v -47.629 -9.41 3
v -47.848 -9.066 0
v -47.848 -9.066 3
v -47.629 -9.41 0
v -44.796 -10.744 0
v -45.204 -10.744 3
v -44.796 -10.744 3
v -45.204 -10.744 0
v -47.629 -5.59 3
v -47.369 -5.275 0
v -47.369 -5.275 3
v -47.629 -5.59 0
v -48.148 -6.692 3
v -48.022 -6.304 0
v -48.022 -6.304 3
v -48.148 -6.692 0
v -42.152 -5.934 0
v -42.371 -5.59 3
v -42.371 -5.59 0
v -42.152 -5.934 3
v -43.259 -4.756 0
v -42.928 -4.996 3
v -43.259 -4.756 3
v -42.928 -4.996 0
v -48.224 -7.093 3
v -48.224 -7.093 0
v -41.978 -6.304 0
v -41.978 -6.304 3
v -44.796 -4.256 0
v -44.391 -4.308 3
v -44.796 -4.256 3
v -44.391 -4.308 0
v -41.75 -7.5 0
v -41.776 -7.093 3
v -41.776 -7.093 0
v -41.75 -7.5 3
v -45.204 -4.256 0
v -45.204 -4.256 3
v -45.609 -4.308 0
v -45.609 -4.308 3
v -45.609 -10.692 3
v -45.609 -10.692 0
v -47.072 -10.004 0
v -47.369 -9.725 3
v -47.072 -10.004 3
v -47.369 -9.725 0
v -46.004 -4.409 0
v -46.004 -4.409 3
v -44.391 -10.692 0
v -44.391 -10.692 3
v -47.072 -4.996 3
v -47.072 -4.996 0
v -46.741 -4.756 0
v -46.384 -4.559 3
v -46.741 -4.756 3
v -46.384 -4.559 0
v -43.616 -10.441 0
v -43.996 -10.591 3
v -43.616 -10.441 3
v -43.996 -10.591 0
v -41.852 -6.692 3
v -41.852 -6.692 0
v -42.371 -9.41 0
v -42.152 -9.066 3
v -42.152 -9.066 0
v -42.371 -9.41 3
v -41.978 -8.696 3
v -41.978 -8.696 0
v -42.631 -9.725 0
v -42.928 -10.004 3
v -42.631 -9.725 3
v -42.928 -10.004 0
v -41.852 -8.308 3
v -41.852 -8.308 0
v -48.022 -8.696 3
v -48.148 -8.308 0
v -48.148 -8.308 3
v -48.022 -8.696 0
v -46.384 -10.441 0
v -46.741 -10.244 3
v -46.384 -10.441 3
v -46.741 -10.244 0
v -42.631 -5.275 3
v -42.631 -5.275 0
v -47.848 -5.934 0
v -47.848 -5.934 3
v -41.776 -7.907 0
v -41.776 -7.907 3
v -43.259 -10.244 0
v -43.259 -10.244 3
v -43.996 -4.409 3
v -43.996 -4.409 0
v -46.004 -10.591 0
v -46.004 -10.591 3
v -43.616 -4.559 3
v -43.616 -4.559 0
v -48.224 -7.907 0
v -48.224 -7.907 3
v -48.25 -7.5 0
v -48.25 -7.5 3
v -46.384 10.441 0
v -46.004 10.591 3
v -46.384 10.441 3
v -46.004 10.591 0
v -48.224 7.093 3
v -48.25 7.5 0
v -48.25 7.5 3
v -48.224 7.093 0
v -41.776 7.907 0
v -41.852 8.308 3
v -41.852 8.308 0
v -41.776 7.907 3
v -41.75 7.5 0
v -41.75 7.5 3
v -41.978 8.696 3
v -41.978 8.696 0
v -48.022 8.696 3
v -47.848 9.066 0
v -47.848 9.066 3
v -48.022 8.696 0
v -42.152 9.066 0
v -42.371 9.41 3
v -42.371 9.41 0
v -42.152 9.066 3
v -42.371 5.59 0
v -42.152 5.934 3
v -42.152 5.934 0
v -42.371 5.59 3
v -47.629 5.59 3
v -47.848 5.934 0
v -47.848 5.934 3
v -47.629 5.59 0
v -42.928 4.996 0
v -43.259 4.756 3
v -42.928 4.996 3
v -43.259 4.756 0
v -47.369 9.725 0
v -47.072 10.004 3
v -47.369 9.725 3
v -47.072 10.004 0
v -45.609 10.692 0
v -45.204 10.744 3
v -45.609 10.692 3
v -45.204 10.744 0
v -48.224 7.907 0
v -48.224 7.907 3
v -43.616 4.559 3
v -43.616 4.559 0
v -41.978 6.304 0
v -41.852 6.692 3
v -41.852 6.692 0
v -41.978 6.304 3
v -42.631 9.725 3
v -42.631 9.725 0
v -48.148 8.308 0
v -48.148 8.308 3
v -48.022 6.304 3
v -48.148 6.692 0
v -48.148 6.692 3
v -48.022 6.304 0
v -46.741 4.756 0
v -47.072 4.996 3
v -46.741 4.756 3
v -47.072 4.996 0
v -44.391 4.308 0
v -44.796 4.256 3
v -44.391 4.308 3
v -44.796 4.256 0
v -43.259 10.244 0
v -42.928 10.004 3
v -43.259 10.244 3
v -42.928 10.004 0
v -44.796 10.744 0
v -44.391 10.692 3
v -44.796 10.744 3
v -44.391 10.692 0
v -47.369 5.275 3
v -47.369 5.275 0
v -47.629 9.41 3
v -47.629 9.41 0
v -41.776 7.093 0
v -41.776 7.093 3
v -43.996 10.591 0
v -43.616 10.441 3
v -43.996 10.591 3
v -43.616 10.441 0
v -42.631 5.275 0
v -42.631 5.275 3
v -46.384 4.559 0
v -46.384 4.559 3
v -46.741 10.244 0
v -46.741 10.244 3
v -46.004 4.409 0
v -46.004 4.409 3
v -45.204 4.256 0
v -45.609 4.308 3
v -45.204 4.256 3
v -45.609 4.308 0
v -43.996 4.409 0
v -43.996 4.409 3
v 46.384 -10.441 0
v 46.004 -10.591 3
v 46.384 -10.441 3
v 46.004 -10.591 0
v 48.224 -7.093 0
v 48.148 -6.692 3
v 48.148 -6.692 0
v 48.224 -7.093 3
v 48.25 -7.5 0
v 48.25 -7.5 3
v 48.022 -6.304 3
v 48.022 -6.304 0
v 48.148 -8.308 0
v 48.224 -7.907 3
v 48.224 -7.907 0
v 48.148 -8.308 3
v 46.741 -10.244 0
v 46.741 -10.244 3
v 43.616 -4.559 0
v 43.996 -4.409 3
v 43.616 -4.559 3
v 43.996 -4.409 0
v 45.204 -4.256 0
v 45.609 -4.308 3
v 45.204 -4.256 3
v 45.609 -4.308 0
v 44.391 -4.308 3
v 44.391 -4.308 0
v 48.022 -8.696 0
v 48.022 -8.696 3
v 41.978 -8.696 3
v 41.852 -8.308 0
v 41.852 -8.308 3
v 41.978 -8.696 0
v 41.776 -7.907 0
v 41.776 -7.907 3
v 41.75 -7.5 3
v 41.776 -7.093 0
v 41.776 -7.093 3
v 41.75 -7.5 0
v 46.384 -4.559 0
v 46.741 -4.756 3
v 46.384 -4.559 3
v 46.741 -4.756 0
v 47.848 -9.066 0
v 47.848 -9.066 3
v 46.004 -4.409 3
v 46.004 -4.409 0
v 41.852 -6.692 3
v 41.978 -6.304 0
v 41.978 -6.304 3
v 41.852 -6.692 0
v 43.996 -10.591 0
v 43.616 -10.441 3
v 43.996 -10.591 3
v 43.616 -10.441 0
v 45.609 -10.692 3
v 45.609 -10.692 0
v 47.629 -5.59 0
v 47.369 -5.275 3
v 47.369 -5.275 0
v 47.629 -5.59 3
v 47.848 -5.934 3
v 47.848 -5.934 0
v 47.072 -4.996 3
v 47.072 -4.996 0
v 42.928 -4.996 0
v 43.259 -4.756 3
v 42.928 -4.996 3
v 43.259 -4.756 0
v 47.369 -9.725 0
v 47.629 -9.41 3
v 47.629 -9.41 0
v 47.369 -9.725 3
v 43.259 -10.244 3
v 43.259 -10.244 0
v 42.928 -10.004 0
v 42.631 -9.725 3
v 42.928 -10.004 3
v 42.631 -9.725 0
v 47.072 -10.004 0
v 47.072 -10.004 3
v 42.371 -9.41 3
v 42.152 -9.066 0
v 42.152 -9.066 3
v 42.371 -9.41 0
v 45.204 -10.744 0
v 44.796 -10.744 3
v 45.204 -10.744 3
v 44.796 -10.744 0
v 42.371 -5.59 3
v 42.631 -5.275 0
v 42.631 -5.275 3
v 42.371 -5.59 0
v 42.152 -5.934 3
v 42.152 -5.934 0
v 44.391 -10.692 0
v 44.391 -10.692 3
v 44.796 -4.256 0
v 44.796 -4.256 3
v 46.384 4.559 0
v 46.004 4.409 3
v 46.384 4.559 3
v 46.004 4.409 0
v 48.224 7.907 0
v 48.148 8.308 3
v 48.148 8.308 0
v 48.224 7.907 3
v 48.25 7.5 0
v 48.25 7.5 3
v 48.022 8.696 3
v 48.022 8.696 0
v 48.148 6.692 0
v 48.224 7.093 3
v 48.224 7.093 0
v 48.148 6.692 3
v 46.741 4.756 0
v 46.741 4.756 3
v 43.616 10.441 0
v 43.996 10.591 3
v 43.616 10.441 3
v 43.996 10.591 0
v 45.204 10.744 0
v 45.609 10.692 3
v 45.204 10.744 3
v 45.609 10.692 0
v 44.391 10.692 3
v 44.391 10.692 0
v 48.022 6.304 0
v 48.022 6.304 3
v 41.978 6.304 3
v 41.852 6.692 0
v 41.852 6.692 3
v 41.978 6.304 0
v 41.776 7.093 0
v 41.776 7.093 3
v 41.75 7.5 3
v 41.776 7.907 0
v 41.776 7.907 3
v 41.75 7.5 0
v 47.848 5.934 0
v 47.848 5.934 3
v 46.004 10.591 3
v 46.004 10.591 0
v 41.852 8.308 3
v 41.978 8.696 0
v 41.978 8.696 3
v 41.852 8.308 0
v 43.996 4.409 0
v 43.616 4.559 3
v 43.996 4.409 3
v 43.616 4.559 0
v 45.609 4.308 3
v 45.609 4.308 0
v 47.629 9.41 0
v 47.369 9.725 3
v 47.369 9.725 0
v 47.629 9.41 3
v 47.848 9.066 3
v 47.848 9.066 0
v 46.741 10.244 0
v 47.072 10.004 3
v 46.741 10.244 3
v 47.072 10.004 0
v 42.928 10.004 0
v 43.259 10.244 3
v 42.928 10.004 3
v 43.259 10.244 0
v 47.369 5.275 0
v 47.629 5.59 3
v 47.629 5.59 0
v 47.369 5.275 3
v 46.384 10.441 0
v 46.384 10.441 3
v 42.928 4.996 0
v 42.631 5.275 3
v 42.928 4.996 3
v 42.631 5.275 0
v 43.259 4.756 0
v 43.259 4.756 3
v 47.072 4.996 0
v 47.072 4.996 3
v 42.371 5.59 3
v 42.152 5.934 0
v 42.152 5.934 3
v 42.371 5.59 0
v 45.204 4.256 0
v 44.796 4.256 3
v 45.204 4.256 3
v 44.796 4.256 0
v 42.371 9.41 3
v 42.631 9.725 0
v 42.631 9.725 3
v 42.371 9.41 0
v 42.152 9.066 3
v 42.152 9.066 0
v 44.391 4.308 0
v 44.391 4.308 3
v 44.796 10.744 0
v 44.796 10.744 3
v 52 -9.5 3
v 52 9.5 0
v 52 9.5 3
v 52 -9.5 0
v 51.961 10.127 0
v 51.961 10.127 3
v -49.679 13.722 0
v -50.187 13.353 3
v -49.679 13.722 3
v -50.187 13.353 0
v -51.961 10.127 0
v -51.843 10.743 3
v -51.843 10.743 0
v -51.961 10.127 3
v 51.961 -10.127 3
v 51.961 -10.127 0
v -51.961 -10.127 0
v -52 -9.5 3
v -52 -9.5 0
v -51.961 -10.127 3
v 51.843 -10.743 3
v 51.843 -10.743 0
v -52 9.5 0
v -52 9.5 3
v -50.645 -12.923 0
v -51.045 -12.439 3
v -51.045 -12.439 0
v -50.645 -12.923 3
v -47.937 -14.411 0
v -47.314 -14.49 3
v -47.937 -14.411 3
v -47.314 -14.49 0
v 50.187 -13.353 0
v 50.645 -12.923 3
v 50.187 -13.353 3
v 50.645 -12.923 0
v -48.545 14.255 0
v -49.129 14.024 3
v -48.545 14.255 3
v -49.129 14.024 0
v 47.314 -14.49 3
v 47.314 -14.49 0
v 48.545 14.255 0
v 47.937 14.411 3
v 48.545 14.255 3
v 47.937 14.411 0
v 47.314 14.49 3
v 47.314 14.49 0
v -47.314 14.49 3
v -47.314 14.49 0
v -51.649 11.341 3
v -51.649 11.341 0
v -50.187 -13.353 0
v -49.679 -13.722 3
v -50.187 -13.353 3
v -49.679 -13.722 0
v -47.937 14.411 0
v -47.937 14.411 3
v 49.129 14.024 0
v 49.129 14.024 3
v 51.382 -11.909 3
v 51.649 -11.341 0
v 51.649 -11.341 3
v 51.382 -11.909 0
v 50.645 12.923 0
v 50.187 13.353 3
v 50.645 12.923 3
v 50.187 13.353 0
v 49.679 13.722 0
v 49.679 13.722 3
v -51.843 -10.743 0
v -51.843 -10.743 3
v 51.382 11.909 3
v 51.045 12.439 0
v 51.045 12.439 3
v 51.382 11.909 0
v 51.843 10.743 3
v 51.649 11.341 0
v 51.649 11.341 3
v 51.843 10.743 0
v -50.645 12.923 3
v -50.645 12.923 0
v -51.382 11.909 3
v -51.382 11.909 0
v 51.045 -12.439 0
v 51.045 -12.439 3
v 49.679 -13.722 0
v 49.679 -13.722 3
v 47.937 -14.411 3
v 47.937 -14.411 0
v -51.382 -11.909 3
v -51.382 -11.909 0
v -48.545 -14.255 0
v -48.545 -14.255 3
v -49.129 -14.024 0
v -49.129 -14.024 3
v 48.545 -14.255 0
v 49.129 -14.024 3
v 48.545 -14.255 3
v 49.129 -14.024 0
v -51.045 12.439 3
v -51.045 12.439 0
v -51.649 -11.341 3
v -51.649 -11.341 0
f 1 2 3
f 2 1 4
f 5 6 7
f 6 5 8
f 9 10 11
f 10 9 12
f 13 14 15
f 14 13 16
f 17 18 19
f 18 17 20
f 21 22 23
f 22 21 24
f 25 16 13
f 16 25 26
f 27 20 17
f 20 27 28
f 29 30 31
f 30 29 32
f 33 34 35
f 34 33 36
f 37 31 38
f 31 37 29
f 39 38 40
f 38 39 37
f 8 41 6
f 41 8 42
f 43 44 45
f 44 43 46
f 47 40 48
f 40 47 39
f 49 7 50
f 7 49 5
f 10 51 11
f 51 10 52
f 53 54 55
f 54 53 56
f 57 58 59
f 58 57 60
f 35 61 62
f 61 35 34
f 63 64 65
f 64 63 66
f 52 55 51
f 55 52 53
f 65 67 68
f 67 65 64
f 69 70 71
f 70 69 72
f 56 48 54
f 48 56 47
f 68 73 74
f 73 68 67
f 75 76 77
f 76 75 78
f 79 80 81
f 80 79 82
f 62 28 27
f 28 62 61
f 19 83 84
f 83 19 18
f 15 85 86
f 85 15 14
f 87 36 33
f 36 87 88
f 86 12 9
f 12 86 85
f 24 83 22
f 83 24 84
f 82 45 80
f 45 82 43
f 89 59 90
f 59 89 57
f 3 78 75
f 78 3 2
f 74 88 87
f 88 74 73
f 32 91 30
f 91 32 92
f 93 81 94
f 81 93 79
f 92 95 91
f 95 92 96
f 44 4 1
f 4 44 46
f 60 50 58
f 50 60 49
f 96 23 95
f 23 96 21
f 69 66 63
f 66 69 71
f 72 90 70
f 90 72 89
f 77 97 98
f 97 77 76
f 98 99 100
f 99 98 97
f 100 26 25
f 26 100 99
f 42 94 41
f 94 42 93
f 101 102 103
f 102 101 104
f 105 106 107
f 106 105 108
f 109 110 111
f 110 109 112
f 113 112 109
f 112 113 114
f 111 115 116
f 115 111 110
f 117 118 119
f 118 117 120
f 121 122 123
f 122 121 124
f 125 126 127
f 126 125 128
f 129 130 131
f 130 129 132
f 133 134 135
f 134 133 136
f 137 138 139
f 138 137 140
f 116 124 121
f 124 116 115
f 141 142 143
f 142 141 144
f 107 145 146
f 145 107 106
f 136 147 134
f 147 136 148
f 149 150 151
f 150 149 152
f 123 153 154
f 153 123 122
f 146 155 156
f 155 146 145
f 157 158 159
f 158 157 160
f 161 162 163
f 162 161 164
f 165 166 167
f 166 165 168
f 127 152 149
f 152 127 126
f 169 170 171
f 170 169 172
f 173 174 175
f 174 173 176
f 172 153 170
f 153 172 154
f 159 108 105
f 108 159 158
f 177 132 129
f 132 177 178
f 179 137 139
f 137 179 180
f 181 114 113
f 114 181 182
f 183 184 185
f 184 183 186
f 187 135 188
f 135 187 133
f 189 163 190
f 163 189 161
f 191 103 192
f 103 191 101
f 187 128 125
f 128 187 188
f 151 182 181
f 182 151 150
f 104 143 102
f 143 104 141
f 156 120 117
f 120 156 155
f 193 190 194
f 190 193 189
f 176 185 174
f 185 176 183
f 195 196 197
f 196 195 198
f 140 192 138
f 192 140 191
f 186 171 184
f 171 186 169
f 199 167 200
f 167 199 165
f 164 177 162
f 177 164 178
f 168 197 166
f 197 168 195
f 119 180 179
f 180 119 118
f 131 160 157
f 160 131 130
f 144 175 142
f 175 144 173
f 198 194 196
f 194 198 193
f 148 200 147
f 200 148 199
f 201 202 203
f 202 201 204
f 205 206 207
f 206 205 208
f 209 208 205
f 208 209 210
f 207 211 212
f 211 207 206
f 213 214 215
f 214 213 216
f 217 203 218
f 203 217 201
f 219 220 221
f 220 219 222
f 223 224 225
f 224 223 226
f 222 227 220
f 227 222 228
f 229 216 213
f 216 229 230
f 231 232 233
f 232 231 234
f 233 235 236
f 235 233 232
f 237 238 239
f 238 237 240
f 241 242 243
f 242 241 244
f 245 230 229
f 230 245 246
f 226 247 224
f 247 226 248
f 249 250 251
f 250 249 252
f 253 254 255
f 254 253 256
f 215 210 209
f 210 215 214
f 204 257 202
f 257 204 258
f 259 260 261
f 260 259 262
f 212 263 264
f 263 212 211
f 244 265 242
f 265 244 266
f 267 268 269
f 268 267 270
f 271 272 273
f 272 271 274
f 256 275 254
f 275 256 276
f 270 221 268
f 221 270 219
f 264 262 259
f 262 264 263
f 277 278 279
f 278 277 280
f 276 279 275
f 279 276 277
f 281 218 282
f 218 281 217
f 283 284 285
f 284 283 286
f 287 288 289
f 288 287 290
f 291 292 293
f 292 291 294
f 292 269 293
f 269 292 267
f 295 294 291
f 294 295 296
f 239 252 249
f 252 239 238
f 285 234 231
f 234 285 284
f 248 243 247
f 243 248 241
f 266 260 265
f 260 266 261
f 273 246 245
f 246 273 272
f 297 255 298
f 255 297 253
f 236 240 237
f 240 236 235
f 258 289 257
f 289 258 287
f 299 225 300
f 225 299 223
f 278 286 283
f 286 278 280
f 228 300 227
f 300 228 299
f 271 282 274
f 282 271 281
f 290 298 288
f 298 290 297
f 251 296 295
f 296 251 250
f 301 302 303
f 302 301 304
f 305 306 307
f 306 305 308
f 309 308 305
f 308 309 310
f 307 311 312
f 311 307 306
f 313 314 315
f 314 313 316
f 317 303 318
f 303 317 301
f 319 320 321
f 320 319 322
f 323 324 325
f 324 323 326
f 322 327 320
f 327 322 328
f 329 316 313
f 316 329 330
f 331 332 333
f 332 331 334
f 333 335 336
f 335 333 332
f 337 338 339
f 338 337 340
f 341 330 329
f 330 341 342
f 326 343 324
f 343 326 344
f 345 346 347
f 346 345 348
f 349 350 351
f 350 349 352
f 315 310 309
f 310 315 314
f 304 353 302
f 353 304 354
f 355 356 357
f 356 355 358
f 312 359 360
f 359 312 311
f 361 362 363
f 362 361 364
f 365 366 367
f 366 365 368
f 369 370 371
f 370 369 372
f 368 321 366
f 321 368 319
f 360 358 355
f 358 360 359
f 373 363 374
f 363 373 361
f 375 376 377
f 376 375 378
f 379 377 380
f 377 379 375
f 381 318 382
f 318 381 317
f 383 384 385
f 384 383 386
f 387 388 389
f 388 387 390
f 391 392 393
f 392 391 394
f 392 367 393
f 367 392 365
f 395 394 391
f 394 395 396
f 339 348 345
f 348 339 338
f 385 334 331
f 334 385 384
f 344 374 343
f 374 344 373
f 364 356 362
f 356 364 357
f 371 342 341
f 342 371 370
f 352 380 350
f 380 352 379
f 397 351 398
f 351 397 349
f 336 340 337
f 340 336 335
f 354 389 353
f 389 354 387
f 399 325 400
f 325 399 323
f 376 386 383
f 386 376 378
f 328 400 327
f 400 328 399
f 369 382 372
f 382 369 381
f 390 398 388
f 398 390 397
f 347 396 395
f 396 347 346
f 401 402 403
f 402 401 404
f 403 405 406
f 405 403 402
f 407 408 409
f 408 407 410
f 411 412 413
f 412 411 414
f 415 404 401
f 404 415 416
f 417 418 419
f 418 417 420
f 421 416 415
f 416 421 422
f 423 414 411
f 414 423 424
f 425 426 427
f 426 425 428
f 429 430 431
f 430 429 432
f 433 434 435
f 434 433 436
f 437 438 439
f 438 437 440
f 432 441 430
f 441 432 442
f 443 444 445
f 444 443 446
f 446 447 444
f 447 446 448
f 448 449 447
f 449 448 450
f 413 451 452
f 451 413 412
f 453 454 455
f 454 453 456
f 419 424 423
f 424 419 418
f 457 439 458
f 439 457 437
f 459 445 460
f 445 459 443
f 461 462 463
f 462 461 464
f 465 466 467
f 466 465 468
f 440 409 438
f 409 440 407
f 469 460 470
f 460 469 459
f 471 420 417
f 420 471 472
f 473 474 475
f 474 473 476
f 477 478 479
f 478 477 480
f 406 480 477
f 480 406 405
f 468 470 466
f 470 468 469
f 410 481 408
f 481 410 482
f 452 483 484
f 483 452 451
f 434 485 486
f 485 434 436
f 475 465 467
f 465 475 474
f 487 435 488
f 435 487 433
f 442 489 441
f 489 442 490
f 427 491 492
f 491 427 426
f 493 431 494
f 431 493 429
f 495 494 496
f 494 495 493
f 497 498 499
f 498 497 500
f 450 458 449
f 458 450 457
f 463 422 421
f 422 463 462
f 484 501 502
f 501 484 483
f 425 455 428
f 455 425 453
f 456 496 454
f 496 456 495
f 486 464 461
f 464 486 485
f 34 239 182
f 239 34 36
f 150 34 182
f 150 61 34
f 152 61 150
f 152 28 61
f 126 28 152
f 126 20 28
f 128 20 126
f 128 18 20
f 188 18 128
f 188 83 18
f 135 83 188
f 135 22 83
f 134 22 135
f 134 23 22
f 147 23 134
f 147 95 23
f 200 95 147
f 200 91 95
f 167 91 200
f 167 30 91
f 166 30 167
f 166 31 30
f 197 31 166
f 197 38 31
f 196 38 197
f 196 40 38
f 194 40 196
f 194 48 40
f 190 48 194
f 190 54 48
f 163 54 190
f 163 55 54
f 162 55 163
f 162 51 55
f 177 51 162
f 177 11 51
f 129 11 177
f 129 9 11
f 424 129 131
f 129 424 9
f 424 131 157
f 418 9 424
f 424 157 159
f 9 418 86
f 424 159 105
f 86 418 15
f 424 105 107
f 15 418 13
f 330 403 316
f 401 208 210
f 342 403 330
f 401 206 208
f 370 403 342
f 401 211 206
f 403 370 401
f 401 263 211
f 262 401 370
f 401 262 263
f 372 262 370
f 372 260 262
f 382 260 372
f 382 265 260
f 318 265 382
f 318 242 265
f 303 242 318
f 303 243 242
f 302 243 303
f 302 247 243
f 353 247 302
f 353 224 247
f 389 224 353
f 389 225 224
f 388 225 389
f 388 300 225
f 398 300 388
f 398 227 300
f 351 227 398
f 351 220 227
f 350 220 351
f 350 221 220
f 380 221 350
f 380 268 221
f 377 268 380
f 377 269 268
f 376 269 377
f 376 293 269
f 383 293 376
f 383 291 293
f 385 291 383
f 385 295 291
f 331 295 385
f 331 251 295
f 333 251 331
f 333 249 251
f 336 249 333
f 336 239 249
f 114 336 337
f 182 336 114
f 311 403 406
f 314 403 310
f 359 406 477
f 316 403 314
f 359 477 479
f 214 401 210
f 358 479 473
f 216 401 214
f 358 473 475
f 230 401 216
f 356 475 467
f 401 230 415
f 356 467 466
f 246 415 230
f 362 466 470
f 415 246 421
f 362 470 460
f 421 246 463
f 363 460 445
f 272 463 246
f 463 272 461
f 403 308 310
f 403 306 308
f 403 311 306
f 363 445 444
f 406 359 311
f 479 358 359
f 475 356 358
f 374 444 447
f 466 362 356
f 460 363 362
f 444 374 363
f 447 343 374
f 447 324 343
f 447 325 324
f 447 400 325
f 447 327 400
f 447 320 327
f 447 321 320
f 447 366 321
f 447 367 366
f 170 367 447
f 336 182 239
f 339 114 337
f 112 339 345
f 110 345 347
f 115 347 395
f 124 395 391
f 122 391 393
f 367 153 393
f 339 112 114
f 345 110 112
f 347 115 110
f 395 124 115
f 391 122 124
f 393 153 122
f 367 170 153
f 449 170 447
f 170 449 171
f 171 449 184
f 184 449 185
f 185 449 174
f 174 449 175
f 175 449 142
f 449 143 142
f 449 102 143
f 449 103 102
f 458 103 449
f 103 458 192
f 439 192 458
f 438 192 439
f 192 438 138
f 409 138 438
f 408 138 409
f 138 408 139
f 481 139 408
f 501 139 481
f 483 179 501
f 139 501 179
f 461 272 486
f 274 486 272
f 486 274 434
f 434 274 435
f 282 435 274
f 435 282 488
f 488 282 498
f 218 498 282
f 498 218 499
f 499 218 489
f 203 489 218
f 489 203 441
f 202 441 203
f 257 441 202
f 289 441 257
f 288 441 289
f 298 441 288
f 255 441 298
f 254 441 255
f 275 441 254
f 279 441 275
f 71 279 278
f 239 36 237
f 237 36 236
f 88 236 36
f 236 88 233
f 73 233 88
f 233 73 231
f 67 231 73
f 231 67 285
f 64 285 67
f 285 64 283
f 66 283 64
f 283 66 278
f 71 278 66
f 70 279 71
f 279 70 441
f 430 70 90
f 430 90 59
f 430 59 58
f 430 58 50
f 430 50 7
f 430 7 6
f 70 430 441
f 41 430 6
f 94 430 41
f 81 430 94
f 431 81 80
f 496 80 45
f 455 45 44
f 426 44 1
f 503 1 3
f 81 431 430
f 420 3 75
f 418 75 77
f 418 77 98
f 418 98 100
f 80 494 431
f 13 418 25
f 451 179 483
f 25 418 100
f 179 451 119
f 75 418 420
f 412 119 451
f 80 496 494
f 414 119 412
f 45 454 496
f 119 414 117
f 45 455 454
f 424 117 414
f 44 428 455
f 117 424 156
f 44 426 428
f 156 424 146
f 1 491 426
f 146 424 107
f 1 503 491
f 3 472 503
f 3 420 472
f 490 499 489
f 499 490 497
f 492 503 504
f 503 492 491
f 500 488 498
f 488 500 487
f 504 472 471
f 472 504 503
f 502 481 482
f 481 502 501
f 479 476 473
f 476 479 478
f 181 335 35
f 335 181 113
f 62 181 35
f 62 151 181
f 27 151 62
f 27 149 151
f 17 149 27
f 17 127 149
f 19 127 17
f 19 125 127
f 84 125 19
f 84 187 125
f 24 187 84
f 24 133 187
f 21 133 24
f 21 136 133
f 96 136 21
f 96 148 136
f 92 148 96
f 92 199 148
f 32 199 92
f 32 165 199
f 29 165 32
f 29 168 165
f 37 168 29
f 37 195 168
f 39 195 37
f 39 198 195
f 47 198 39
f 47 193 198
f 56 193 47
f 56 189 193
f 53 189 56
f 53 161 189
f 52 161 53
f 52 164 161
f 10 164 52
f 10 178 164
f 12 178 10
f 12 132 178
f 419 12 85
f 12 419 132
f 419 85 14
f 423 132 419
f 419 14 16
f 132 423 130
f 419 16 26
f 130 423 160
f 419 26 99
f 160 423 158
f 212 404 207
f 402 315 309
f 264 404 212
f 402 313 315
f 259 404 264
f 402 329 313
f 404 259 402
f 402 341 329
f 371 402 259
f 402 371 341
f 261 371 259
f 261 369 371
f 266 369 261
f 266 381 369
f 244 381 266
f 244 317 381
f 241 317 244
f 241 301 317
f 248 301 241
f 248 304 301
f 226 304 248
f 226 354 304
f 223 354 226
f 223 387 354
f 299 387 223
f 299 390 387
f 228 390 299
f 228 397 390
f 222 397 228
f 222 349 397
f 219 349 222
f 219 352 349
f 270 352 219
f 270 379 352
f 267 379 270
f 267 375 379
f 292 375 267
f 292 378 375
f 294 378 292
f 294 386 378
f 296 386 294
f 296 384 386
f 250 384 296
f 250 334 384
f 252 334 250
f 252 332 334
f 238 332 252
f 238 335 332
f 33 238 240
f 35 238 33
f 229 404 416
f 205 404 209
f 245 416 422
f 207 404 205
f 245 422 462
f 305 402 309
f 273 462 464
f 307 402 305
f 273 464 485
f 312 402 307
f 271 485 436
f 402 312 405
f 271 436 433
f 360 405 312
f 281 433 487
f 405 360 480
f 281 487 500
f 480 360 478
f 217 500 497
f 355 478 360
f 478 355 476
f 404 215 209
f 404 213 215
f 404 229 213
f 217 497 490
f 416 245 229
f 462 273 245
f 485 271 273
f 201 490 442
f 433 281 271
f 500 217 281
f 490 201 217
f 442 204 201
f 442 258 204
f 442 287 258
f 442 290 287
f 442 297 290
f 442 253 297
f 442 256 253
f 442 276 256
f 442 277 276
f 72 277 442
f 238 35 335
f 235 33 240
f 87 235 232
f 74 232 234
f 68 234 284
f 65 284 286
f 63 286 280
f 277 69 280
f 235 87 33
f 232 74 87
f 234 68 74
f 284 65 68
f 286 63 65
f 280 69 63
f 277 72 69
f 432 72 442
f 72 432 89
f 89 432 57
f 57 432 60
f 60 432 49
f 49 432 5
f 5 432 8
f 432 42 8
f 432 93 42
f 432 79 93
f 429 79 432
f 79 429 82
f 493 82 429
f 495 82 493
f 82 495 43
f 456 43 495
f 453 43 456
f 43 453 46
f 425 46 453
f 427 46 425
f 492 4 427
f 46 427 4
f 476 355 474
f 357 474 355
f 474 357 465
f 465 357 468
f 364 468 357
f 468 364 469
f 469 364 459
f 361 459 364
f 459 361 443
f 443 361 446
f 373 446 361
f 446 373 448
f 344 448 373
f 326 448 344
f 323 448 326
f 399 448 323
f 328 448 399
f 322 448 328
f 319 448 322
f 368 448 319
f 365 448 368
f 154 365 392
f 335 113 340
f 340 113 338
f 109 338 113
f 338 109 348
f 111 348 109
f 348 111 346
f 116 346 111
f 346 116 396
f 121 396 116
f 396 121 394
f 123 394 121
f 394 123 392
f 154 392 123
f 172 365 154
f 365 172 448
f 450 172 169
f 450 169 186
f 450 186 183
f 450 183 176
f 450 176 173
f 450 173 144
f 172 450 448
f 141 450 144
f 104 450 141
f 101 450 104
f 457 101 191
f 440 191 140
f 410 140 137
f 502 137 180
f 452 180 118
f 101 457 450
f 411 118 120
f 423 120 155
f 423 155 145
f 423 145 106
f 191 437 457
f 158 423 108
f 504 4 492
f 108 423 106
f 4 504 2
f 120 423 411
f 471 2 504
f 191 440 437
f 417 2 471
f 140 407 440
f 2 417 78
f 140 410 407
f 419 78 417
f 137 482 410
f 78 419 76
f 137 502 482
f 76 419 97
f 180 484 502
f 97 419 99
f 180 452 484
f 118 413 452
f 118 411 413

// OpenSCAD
$fn = 50;


difference() {
	union() {
		hull() {
			translate(v = [-47.0000000000, 9.5000000000, 0]) {
				cylinder(h = 3, r = 5);
			}
			translate(v = [47.0000000000, 9.5000000000, 0]) {
				cylinder(h = 3, r = 5);
			}
			translate(v = [-47.0000000000, -9.5000000000, 0]) {
				cylinder(h = 3, r = 5);
			}
			translate(v = [47.0000000000, -9.5000000000, 0]) {
				cylinder(h = 3, r = 5);
			}
		}
	}
	union() {
		translate(v = [-45.0000000000, -7.5000000000, -100.0000000000]) {
			cylinder(h = 200, r = 3.2500000000);
		}
		translate(v = [-45.0000000000, 7.5000000000, -100.0000000000]) {
			cylinder(h = 200, r = 3.2500000000);
		}
		translate(v = [45.0000000000, -7.5000000000, -100.0000000000]) {
			cylinder(h = 200, r = 3.2500000000);
		}
		translate(v = [45.0000000000, 7.5000000000, -100.0000000000]) {
			cylinder(h = 200, r = 3.2500000000);
		}
	}
}
